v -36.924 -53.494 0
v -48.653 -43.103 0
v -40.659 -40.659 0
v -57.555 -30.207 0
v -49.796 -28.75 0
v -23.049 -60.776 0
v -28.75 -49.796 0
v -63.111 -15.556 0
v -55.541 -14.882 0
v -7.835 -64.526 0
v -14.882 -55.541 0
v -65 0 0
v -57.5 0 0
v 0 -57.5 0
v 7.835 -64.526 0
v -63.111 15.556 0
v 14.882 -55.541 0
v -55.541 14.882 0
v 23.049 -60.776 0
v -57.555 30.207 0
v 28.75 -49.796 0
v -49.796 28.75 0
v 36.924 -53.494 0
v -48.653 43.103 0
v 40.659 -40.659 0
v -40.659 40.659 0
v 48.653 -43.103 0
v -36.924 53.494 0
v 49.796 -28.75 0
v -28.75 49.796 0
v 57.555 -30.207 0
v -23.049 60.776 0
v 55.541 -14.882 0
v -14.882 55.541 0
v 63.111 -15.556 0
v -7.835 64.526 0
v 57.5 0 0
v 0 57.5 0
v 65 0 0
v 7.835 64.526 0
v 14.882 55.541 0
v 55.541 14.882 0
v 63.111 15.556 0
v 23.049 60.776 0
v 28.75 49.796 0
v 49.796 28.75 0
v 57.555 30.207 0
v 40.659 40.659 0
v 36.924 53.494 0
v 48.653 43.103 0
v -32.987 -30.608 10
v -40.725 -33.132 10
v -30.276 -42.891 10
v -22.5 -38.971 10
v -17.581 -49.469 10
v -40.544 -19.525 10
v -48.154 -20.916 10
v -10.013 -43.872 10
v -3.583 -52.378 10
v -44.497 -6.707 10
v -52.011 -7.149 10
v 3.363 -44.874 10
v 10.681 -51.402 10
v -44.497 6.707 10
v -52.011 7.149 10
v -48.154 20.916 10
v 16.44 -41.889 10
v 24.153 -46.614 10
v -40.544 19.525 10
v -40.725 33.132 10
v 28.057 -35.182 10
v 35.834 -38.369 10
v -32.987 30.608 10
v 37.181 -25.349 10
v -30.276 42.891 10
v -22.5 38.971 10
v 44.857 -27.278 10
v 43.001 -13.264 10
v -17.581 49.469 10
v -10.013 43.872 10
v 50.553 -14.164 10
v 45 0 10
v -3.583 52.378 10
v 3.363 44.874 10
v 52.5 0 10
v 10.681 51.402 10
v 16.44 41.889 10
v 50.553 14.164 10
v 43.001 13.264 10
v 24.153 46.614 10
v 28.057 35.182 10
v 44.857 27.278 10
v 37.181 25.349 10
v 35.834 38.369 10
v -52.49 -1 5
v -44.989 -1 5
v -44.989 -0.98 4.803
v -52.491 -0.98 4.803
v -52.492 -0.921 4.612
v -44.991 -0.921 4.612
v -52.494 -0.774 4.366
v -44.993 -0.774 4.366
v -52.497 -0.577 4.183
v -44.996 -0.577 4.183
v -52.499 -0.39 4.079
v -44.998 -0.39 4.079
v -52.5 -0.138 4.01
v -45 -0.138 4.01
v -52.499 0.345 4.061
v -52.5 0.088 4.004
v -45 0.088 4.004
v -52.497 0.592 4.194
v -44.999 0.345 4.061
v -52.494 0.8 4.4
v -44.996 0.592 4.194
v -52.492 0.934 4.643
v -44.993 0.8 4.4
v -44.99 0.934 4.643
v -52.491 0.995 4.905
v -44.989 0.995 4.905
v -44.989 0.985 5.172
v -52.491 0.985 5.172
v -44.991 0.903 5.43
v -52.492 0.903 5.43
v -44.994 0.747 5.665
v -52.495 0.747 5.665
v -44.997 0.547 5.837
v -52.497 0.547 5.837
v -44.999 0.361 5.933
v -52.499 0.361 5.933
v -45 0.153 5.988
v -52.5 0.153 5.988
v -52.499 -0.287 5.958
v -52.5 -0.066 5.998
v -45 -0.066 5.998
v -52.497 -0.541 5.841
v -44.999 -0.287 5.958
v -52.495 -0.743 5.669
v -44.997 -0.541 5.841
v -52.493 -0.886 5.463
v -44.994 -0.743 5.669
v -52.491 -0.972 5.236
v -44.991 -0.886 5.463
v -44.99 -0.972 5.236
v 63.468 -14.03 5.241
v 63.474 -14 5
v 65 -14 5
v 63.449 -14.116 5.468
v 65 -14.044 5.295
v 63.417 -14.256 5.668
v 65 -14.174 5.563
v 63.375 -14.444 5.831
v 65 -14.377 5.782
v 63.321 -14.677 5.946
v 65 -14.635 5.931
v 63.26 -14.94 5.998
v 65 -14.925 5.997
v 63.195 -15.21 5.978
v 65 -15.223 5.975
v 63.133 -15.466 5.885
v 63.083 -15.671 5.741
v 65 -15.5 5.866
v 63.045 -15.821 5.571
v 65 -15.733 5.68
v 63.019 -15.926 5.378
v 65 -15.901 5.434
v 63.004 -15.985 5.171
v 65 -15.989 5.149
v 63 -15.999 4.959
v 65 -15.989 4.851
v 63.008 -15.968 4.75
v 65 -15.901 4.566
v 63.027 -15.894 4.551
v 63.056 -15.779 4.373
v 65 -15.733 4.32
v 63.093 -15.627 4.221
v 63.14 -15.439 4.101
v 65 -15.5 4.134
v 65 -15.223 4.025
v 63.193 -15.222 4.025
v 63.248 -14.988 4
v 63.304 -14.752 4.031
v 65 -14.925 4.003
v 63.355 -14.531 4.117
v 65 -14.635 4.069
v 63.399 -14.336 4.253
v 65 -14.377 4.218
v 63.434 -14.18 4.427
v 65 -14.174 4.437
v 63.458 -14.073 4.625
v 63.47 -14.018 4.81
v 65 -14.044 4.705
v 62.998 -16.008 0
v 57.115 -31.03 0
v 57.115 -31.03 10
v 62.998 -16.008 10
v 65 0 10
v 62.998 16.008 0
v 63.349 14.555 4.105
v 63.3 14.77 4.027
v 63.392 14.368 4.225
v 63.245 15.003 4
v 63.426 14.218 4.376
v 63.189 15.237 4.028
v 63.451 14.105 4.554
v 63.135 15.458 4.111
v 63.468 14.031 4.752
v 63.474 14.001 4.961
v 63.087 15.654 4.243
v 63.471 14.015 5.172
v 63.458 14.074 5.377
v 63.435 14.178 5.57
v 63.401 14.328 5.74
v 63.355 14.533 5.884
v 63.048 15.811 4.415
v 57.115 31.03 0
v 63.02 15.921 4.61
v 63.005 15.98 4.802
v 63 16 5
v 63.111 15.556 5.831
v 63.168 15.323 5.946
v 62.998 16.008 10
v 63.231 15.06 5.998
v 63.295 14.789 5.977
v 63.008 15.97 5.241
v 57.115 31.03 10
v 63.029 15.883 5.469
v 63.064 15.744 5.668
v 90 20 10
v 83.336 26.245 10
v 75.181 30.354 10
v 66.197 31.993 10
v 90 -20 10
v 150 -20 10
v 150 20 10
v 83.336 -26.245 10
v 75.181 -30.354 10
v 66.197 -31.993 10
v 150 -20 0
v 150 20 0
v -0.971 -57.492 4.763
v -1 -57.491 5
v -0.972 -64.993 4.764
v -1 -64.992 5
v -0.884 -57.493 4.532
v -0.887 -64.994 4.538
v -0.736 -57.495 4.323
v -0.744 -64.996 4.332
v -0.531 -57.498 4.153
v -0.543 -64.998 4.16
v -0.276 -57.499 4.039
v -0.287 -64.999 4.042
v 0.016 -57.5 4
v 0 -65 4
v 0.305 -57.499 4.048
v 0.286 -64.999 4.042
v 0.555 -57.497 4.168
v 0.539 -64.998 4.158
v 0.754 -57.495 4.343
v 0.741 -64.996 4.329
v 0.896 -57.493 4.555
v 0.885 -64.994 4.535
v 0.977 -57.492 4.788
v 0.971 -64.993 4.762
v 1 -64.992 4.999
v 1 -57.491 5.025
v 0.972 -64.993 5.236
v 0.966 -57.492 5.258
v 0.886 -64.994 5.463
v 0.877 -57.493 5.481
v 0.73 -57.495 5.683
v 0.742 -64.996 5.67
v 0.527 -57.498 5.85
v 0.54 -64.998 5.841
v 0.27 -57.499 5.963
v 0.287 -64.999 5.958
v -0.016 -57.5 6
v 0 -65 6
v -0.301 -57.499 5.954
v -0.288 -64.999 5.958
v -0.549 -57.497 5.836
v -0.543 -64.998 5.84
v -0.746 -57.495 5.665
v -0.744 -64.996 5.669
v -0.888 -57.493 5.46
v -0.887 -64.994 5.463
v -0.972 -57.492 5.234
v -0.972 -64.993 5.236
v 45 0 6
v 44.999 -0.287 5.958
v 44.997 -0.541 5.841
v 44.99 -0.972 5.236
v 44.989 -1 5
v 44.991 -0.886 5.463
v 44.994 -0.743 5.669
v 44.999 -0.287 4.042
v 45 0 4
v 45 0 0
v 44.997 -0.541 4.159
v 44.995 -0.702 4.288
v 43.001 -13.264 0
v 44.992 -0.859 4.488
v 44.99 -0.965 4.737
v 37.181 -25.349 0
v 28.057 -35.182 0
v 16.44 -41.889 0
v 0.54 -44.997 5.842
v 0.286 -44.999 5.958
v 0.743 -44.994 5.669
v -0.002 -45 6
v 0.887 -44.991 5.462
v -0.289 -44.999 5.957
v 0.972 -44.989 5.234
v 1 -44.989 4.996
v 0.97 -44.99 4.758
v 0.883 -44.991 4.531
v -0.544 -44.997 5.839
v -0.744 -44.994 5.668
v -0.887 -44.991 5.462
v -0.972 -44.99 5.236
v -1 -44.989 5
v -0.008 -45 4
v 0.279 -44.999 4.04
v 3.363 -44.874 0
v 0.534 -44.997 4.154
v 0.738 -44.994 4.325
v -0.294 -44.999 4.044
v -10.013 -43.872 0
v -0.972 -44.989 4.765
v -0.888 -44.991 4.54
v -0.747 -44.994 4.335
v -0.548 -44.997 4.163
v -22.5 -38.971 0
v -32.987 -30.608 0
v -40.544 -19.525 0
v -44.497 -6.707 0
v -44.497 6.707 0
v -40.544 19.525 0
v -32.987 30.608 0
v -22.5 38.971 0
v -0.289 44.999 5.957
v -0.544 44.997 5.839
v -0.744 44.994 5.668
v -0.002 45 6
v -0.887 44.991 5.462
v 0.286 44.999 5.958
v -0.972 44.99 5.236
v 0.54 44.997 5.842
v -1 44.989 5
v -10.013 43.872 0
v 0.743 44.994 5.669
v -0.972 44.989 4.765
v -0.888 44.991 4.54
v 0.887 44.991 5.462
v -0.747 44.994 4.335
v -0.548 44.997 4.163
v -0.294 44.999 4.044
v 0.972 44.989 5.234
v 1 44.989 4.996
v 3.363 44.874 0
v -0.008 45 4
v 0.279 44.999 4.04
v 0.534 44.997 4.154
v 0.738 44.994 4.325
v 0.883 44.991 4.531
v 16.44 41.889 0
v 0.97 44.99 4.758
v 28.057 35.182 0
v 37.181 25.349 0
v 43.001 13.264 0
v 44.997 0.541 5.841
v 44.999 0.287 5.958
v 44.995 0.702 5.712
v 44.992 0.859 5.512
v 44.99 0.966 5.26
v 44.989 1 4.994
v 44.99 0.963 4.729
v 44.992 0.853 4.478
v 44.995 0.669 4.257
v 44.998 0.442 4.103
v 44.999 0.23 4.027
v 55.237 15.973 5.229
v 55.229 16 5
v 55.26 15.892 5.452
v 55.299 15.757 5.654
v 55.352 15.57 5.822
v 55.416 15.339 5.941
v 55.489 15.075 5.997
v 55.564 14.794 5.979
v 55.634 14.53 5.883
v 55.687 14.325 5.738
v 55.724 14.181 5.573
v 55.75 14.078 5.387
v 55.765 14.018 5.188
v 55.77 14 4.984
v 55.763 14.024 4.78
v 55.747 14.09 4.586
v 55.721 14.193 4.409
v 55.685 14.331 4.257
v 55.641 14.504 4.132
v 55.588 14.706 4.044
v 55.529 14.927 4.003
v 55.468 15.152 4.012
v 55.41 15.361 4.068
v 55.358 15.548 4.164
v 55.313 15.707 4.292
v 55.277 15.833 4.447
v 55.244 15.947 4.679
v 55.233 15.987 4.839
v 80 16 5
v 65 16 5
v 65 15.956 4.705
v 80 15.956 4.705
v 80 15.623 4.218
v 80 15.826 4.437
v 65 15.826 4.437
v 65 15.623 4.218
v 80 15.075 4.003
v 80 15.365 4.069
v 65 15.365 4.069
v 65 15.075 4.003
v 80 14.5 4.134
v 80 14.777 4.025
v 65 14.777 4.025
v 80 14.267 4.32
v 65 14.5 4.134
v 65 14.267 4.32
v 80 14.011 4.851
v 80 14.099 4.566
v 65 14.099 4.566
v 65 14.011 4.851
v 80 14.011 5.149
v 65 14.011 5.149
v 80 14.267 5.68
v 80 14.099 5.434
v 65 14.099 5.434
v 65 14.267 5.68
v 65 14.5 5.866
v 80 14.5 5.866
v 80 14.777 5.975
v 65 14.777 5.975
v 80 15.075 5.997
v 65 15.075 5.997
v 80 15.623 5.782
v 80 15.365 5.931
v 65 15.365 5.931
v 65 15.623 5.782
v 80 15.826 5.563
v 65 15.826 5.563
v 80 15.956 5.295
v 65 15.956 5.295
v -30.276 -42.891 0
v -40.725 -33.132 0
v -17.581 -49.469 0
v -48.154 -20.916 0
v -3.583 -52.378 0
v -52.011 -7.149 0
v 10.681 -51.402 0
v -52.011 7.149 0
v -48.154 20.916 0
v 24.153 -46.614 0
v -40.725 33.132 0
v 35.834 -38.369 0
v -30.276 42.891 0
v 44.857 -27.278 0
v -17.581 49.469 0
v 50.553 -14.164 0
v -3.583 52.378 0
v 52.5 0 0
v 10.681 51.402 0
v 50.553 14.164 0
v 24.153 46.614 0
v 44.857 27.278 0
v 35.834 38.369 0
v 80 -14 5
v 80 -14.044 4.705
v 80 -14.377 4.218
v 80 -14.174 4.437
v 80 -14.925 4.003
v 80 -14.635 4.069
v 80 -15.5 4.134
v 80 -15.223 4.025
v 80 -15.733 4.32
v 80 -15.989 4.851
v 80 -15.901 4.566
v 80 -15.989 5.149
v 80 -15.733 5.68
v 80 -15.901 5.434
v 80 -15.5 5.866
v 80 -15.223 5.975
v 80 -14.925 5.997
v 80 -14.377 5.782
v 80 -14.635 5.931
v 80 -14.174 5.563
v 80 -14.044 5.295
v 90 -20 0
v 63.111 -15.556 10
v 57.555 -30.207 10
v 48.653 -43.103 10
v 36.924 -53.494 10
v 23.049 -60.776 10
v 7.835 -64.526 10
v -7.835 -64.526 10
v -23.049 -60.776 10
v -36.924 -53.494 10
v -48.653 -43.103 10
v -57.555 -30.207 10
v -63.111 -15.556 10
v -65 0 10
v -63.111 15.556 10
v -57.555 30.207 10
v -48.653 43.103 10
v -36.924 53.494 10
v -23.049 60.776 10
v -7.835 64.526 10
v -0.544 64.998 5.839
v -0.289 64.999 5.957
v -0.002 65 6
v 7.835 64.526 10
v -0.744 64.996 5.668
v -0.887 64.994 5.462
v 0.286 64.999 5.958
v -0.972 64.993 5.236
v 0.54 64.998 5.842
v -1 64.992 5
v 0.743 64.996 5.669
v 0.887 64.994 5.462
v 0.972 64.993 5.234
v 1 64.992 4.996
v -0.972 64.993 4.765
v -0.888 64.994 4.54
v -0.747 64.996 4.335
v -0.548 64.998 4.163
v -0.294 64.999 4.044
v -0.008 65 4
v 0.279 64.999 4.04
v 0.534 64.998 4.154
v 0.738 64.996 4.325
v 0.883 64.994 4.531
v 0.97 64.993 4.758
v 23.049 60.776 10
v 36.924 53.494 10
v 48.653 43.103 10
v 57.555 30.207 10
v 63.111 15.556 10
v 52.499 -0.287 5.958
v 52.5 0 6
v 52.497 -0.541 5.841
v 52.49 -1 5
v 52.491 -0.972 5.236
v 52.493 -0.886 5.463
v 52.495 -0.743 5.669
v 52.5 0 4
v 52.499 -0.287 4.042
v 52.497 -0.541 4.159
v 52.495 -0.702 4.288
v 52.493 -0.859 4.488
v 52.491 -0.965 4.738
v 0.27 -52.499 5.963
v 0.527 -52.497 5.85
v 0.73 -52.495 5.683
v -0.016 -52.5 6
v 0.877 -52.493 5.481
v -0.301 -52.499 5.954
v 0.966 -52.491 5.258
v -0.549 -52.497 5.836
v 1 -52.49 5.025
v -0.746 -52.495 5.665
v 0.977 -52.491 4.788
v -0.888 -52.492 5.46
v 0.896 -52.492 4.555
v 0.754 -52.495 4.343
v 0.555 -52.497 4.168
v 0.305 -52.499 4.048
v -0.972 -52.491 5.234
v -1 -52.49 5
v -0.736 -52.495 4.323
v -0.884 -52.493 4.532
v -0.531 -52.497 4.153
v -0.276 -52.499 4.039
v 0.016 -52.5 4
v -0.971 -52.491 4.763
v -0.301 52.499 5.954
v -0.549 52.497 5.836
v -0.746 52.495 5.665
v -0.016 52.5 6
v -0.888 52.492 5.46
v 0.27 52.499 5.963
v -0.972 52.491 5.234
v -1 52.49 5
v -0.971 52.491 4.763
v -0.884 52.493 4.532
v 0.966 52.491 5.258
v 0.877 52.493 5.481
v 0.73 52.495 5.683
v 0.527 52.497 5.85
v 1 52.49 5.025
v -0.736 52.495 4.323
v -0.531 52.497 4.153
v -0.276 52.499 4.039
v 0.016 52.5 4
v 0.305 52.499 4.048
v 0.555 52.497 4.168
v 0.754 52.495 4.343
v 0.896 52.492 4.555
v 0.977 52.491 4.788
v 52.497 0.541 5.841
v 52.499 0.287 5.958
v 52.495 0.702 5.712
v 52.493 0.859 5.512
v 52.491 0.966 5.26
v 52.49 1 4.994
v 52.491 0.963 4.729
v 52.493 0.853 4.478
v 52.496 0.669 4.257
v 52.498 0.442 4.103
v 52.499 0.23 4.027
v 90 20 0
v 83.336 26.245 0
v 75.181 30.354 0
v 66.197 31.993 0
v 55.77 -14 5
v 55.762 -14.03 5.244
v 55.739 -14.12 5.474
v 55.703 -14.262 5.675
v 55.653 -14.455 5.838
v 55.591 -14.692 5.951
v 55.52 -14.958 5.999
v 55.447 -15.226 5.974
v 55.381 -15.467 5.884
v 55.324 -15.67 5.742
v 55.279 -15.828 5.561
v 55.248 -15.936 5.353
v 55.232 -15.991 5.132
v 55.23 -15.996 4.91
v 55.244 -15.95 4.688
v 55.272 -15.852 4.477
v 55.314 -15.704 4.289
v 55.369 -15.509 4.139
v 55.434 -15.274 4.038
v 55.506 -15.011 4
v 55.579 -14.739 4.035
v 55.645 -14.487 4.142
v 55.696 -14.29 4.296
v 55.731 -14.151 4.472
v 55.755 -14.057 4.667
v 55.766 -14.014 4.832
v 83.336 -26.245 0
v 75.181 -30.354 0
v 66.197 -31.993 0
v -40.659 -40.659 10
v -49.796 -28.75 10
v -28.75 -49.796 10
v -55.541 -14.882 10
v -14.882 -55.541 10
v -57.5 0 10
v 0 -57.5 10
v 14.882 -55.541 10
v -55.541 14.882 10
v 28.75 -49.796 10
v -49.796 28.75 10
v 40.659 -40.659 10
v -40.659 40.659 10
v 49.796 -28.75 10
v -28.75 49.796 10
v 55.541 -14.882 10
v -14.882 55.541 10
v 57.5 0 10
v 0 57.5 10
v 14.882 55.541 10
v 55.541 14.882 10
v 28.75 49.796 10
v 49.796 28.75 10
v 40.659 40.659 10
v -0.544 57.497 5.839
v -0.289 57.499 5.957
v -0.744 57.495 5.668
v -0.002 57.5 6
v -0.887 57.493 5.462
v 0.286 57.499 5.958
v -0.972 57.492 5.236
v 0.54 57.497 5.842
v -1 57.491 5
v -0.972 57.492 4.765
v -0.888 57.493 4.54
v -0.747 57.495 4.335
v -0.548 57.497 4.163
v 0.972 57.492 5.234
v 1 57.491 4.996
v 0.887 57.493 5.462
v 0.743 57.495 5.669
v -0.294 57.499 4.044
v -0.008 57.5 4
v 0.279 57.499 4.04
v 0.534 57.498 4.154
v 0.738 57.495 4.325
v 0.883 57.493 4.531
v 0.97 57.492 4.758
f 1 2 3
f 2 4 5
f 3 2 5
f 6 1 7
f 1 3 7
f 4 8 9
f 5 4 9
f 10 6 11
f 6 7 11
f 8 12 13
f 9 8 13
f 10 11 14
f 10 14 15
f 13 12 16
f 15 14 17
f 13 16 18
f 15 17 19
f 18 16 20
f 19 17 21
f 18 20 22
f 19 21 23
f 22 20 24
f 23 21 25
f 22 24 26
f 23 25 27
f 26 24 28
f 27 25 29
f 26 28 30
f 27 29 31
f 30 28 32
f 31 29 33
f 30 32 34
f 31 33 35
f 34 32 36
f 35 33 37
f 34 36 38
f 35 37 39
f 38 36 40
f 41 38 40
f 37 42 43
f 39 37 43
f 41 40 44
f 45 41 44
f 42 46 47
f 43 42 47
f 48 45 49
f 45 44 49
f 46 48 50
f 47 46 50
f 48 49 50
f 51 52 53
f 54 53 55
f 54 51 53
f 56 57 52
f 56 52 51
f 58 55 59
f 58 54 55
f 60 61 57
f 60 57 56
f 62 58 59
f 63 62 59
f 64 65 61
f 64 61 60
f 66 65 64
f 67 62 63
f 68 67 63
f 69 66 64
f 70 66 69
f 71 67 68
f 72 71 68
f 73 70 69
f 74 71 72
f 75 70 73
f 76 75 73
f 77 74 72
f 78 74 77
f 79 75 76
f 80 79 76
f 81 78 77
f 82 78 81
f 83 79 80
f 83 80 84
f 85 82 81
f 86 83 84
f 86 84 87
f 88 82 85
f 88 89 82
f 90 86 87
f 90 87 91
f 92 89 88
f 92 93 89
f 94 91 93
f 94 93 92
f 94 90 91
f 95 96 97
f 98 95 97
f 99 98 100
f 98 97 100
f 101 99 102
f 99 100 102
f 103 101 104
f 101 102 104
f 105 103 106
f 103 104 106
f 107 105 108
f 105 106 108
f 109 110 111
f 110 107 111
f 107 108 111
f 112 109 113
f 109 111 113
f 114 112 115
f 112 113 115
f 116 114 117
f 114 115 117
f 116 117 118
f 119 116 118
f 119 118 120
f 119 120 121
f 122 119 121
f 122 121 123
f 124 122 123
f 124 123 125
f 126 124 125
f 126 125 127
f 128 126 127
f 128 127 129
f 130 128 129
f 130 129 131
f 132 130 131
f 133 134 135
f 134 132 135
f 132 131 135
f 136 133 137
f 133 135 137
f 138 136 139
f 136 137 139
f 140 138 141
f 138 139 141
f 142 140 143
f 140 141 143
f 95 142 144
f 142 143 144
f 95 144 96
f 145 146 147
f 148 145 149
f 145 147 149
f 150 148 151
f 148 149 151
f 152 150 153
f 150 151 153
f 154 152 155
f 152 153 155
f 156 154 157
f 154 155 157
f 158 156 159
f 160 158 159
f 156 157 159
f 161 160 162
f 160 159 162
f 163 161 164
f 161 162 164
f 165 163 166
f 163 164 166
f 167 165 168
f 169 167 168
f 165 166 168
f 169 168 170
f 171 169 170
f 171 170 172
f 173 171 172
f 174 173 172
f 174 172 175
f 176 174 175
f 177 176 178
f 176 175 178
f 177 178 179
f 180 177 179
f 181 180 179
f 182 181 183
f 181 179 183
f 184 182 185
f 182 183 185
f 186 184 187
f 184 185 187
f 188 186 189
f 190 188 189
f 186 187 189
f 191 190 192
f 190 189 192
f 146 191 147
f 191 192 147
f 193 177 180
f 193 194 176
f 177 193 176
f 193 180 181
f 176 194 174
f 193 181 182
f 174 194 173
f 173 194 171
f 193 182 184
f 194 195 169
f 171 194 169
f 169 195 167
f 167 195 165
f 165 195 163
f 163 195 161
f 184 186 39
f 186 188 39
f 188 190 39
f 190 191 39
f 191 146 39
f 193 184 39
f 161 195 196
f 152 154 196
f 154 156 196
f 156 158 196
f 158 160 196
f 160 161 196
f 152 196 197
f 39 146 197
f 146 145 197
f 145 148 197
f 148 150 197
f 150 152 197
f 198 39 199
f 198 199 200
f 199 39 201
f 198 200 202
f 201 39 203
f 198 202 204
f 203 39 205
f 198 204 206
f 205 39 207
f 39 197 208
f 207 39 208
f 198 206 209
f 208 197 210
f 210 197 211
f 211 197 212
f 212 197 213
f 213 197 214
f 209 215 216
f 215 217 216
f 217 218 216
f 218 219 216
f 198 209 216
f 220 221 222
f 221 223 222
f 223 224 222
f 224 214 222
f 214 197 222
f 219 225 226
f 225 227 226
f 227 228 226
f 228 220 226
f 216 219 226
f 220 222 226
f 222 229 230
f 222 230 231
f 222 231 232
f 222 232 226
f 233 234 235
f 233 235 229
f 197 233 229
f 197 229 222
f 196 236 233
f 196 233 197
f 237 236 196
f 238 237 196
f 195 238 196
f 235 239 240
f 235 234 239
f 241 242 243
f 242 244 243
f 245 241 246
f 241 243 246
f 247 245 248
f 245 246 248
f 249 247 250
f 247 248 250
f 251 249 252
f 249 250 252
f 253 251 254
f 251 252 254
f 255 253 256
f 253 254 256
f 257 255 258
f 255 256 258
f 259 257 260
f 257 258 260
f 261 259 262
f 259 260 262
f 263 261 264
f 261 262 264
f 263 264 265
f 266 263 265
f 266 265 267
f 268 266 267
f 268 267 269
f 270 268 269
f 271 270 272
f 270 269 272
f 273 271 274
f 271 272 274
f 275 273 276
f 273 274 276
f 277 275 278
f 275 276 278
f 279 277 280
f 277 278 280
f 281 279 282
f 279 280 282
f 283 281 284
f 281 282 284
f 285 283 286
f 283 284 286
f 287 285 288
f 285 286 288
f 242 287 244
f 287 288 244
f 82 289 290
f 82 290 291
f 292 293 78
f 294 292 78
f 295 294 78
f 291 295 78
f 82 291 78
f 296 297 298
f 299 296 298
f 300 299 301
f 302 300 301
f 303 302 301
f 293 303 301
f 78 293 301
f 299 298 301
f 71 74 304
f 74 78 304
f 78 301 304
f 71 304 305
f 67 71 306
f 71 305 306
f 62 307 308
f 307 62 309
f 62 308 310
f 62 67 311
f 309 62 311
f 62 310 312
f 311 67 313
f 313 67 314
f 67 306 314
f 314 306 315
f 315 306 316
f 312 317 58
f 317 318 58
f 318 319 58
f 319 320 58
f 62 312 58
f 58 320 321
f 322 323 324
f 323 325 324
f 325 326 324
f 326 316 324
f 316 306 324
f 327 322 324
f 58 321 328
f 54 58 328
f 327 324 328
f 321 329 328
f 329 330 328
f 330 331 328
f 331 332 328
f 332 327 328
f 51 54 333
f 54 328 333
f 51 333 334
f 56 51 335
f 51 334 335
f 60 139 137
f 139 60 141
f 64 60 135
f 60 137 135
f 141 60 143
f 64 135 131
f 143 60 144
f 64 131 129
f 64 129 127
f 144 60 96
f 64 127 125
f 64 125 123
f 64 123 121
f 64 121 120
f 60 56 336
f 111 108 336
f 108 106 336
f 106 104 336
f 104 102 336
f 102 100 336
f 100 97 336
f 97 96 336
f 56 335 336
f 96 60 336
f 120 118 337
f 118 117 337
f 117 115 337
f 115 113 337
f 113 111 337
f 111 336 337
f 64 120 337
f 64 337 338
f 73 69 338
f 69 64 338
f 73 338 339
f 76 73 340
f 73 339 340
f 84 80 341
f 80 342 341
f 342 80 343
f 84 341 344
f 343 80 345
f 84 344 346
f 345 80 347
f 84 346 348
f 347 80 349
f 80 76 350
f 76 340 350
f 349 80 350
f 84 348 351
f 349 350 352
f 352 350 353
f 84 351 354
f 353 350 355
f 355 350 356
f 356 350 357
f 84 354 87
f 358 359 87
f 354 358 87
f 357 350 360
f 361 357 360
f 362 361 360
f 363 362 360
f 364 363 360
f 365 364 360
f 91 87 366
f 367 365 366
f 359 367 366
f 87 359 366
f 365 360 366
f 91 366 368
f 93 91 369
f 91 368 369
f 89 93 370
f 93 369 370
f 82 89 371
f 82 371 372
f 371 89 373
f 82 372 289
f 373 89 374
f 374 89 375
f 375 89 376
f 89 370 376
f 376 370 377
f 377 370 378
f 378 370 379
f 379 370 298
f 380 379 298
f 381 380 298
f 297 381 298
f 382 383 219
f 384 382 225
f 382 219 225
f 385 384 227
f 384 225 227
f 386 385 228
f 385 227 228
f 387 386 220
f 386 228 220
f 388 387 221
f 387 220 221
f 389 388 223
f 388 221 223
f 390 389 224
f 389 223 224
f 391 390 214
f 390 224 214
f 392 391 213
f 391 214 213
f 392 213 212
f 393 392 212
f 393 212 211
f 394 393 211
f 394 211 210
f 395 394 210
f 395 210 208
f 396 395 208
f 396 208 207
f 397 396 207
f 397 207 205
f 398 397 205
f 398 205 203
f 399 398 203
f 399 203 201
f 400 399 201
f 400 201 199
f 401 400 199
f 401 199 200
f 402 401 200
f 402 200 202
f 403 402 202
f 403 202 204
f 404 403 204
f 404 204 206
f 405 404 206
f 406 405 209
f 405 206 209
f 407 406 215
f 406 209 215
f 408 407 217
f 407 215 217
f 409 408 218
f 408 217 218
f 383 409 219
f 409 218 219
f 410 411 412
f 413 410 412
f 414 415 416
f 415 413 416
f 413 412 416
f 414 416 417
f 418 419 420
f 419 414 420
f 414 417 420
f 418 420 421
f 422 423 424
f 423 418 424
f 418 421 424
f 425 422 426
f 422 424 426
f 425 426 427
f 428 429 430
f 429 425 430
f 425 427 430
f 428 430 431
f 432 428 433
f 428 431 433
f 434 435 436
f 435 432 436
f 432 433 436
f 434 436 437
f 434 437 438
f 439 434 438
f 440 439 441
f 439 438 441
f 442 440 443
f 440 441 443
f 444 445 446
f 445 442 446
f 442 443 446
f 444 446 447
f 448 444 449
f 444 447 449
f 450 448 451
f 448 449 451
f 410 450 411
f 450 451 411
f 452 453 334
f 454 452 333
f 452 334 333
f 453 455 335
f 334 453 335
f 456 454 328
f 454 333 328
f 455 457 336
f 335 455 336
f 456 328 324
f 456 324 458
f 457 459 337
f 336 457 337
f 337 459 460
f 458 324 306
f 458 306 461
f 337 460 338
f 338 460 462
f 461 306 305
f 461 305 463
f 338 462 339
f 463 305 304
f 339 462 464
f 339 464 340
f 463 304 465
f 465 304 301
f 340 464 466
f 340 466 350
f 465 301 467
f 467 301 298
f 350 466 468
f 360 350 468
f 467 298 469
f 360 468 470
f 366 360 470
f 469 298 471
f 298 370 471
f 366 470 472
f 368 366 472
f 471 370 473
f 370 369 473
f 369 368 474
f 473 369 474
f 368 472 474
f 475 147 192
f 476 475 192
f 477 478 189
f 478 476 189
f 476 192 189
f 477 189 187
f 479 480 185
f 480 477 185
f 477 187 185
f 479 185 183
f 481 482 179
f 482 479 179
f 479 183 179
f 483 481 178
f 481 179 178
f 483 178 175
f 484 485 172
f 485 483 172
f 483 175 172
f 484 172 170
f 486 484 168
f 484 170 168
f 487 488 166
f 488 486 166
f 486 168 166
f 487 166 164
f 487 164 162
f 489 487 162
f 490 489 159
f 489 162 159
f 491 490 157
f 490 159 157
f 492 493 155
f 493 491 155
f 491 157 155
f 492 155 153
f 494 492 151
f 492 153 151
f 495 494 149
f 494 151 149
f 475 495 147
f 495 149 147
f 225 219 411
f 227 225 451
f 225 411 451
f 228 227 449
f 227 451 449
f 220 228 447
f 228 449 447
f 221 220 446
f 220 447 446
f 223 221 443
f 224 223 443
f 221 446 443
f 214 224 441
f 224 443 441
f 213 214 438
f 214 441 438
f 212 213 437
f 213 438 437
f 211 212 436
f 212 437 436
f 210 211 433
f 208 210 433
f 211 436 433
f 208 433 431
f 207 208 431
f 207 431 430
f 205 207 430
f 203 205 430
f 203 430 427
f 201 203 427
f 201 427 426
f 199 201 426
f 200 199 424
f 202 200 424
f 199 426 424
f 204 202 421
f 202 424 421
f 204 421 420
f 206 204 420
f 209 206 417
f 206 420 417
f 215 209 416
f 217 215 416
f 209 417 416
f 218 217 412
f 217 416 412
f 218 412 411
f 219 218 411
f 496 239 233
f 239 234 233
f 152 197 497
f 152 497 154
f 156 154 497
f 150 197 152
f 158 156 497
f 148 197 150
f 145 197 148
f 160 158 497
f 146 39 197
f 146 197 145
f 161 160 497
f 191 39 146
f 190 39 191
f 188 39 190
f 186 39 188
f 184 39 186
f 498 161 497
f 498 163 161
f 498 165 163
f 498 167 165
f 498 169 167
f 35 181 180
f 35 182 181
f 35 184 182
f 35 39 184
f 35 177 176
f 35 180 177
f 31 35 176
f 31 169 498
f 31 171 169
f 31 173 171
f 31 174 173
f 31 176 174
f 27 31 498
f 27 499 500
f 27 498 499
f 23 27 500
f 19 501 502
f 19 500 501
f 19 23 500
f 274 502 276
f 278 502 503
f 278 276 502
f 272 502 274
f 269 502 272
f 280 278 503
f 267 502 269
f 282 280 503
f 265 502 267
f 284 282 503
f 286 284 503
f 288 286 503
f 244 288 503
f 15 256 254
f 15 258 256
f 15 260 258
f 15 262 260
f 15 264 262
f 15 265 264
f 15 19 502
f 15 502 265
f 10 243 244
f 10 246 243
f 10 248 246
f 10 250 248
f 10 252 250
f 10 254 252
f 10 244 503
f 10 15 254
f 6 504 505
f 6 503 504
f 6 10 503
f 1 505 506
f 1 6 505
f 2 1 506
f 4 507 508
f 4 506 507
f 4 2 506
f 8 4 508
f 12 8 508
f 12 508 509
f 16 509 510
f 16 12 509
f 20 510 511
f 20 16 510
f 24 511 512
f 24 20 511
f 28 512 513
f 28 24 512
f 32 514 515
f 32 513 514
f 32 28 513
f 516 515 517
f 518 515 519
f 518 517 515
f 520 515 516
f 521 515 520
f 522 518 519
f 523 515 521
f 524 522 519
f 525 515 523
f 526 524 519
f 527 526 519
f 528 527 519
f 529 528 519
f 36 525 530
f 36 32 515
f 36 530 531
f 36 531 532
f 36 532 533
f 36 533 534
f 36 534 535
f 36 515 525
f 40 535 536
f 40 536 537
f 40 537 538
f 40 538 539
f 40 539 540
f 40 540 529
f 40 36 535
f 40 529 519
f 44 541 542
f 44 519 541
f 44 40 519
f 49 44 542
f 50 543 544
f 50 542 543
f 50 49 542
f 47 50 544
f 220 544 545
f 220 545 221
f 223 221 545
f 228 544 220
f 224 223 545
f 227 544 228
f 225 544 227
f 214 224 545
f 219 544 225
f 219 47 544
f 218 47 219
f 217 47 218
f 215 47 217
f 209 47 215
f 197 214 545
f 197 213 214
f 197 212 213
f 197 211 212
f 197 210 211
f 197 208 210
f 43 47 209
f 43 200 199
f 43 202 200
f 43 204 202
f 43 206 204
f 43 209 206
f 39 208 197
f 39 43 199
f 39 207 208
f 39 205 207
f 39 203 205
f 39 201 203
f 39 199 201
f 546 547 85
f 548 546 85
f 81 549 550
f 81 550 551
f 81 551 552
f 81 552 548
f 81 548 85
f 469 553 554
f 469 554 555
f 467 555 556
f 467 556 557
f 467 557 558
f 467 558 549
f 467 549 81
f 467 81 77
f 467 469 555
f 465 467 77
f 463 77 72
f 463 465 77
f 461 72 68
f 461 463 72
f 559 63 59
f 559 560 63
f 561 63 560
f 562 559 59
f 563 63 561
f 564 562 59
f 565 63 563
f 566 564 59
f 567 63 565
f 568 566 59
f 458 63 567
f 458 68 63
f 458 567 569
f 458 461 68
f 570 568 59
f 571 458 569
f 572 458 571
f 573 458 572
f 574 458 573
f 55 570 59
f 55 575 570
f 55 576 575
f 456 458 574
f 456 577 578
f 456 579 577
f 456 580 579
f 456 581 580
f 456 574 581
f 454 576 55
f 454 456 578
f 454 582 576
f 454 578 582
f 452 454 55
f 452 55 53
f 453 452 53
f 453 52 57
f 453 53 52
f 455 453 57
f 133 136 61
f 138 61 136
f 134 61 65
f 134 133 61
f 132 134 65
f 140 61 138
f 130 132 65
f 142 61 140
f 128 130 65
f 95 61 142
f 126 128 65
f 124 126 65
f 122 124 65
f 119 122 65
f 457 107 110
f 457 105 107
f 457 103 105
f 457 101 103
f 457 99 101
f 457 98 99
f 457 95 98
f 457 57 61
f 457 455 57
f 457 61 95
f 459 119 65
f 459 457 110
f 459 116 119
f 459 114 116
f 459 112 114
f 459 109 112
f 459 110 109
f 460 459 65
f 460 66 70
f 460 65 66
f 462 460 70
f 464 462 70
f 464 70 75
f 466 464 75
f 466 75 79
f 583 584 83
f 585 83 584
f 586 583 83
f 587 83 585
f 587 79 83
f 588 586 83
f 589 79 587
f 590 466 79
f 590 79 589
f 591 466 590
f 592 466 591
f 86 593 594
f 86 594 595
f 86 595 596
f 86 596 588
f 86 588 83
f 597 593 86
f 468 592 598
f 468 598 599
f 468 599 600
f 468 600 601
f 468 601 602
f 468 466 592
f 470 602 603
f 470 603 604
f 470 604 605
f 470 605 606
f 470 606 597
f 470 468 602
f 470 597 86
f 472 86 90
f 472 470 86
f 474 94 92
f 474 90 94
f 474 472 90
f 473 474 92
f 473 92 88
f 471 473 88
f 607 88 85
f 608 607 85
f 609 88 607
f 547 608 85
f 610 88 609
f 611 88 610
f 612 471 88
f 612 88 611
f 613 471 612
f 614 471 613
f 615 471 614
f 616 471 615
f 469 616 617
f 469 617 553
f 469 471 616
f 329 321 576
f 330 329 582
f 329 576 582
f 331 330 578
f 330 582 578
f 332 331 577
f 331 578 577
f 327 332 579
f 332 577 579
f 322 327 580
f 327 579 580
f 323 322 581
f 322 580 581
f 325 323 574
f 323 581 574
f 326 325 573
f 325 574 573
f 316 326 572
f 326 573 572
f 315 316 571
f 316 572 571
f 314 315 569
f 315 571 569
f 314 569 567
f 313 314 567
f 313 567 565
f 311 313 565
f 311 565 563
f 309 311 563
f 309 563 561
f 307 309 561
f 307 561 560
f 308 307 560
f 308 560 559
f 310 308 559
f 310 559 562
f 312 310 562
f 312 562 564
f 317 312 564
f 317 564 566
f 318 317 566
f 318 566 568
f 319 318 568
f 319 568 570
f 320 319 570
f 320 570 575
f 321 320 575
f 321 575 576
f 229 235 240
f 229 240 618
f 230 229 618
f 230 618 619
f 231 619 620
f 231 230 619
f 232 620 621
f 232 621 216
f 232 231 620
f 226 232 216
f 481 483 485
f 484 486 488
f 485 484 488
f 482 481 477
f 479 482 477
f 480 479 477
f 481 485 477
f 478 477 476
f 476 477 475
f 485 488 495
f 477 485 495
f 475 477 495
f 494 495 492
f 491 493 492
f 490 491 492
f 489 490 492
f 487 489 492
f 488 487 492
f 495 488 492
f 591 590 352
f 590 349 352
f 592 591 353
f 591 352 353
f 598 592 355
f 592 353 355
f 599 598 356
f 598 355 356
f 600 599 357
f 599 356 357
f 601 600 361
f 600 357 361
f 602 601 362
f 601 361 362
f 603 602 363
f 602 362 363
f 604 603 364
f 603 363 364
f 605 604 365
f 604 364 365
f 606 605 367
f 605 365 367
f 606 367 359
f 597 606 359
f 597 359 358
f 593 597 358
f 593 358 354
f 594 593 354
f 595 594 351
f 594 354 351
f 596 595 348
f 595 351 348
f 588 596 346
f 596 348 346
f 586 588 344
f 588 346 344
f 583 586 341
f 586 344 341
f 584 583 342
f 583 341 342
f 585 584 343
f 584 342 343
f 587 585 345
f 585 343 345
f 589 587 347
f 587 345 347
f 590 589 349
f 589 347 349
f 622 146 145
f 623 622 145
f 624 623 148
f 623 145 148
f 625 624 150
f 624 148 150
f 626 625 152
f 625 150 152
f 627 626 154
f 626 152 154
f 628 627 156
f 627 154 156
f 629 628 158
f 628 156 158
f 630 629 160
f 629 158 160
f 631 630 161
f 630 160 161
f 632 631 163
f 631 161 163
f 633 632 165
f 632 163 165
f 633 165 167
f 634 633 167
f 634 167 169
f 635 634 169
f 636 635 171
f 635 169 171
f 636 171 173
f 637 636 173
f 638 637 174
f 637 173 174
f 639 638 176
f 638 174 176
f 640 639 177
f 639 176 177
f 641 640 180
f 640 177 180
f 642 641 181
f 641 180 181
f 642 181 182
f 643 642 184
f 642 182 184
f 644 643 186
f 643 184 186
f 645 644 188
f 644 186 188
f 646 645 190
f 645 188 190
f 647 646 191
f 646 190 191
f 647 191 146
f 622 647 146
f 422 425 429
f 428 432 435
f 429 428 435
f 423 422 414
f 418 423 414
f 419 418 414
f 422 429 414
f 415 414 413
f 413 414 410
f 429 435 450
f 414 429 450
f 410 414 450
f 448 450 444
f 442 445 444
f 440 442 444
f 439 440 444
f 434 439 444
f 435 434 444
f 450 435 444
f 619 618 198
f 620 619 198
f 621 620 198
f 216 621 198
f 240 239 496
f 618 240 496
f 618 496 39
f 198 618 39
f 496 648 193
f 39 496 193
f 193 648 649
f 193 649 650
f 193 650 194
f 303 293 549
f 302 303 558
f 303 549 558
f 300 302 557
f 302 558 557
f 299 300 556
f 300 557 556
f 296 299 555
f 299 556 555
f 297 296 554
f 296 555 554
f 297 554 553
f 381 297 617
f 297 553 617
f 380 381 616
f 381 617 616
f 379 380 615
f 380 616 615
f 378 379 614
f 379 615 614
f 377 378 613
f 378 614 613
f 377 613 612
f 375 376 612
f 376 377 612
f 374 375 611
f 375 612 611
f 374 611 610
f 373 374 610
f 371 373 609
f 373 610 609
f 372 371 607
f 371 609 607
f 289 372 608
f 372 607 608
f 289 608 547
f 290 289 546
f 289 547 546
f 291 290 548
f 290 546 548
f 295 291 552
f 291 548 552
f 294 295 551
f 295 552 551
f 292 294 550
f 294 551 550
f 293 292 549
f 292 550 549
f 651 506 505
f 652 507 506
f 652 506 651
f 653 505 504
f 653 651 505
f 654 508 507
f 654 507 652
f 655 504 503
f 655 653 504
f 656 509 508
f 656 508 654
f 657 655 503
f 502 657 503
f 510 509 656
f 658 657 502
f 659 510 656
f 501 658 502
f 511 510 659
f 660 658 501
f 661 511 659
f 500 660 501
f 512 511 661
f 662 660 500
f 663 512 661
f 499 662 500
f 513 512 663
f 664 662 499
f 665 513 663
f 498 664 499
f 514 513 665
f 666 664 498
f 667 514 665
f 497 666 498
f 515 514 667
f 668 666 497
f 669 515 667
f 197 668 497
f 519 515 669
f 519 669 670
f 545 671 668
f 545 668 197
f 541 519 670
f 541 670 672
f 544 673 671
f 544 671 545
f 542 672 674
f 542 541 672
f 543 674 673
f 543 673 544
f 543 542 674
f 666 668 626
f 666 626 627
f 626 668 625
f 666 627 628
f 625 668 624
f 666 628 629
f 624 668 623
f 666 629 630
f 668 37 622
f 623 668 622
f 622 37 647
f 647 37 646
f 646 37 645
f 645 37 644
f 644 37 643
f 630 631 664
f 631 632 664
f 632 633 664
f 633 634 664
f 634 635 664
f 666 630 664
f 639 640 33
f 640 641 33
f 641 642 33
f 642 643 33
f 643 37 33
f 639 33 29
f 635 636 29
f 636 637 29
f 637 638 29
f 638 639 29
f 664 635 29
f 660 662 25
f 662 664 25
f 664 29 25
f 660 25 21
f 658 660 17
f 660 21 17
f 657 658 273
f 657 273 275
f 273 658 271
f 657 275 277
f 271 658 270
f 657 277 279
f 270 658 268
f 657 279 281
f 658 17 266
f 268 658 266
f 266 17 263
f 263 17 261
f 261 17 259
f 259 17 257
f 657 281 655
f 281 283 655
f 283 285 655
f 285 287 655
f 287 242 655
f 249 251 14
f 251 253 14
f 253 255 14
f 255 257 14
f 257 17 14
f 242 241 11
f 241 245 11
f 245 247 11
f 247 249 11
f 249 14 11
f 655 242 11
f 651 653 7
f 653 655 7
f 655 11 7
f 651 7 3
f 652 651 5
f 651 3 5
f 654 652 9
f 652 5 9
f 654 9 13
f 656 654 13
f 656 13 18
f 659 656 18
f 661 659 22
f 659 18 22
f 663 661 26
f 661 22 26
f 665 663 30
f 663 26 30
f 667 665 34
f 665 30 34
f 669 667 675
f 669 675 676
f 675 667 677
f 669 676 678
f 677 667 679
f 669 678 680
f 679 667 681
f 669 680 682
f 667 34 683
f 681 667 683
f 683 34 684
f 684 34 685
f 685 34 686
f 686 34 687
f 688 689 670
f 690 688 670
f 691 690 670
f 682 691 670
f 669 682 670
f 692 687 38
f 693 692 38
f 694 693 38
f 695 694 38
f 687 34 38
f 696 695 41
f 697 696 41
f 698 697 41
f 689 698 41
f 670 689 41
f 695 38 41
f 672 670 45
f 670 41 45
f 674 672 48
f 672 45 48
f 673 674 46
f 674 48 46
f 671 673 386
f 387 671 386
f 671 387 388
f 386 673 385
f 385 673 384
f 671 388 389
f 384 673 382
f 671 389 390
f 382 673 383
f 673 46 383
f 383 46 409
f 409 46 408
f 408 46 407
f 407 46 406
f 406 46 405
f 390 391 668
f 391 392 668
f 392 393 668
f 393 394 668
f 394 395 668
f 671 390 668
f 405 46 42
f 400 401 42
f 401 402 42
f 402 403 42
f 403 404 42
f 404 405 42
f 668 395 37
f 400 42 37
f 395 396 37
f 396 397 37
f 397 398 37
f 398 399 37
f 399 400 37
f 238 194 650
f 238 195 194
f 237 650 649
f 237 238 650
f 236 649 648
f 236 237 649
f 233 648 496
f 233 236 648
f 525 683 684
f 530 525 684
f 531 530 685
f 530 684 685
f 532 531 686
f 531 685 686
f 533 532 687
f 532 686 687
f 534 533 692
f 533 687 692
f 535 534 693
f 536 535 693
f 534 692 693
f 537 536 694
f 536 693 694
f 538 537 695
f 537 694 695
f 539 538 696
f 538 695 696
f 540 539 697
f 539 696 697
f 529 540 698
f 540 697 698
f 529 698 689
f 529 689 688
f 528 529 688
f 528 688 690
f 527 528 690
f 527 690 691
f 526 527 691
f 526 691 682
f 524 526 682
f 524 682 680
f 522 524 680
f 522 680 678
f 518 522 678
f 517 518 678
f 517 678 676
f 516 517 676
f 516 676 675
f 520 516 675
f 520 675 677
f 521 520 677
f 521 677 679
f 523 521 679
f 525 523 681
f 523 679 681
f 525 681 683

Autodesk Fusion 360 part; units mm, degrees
sketch "Sketch1" plane through (0, 0, 0) normal (0, 0, 1) x (1, 0, 0)
  circle A0 centre (0, 0) radius 45
  circle A1 centre (0, 0) radius 52.5
  dimension "d1" = 90
  dimension "d2" = 105
extrude "Extrude1" add sketch "Sketch1" along normal blind 10 makes body 1
sketch "Sketch2" plane through (0, 0, 0) normal (0, 0, 1) x (1, 0, 0)
  circle A0 centre (0, 0) radius 57.5
  circle A1 centre (0, 0) radius 65
  dimension "d5" = 115
  dimension "d6" = 130
extrude "Extrude2" add sketch "Sketch2" along normal blind 10 separate body makes body 2
sketch "Sketch3" plane through (0, 0, 10) normal (0, 0, 1) x (-1, 0, 0)
  circle A0 centre (0, 0) radius 57.5
  circle A1 centre (0, 0) radius 65
  line L0 (0, 0) -> (0, 65)
  line L1 (0, 0) -> (65, 0)
  line L2 (0, 0) -> (-65, 0)
ref_plane "WorkPlane1" through (-65, 0, 10) normal (-1, 0, 0) x (0, -1, 0)
sketch "Sketch4" plane through (-65, 0, 0) normal (-1, 0, 0) x (0, -1, 0)
  circle A0 centre (0, 5) radius 1
  dimension "d9" = 2
ref_plane "WorkPlane2" through (0, -65, 10) normal (0, -1, 0) x (1, 0, 0)
sketch "Sketch5" plane through (0, -65, 0) normal (0, -1, 0) x (-1, 0, 0)
  circle A0 centre (0, -5) radius 1
  dimension "d10" = 2
extrude "Extrude3" cut sketch "Sketch5" against normal blind 195 bodies 1 2
extrude "Extrude4" cut sketch "Sketch4" along normal blind -12 and the other way blind 119 bodies 1
ref_plane "WorkPlane3" through (65, 0, 10) normal (1, 0, 0) x (0, 1, 0)
sketch "Sketch6" plane through (65, 0, 0) normal (1, 0, 0) x (0, 1, 0)
  circle A0 centre (-15, 5) radius 1
  circle A1 centre (15, 5) radius 1
  dimension "d17" = 2
  dimension "d18" = 2
extrude "Extrude5" cut sketch "Sketch6" along normal up to surface end surface at (8.8883, 56.8089, 4.914) on bodies 2 bodies 2
sketch "Sketch7" plane through (0, 0, 10) normal (0, 0, 1) x (-1, 0, 0)
  circle A0 centre (0, 0) radius 57.5
  circle A1 centre (0, 0) radius 65
  line L0 (-110, 20) -> (-150, 20)
  line L1 (-150, 20) -> (-150, -20)
  line L2 (-150, -20) -> (-90, -20)
  line L3 (-110, 20) -> (-90, 20)
  circle A2 centre (-65, 0) radius 32.0156
extrude "Extrude6" add sketch "Sketch7" against normal up to surface (10 mm away) separate body contours A1 A2 | L0 L1 L2 L3 A2 makes body 3
extrude "Extrude7" cut sketch "Sketch6" along normal blind 15 and the other way blind 5 bodies 3
